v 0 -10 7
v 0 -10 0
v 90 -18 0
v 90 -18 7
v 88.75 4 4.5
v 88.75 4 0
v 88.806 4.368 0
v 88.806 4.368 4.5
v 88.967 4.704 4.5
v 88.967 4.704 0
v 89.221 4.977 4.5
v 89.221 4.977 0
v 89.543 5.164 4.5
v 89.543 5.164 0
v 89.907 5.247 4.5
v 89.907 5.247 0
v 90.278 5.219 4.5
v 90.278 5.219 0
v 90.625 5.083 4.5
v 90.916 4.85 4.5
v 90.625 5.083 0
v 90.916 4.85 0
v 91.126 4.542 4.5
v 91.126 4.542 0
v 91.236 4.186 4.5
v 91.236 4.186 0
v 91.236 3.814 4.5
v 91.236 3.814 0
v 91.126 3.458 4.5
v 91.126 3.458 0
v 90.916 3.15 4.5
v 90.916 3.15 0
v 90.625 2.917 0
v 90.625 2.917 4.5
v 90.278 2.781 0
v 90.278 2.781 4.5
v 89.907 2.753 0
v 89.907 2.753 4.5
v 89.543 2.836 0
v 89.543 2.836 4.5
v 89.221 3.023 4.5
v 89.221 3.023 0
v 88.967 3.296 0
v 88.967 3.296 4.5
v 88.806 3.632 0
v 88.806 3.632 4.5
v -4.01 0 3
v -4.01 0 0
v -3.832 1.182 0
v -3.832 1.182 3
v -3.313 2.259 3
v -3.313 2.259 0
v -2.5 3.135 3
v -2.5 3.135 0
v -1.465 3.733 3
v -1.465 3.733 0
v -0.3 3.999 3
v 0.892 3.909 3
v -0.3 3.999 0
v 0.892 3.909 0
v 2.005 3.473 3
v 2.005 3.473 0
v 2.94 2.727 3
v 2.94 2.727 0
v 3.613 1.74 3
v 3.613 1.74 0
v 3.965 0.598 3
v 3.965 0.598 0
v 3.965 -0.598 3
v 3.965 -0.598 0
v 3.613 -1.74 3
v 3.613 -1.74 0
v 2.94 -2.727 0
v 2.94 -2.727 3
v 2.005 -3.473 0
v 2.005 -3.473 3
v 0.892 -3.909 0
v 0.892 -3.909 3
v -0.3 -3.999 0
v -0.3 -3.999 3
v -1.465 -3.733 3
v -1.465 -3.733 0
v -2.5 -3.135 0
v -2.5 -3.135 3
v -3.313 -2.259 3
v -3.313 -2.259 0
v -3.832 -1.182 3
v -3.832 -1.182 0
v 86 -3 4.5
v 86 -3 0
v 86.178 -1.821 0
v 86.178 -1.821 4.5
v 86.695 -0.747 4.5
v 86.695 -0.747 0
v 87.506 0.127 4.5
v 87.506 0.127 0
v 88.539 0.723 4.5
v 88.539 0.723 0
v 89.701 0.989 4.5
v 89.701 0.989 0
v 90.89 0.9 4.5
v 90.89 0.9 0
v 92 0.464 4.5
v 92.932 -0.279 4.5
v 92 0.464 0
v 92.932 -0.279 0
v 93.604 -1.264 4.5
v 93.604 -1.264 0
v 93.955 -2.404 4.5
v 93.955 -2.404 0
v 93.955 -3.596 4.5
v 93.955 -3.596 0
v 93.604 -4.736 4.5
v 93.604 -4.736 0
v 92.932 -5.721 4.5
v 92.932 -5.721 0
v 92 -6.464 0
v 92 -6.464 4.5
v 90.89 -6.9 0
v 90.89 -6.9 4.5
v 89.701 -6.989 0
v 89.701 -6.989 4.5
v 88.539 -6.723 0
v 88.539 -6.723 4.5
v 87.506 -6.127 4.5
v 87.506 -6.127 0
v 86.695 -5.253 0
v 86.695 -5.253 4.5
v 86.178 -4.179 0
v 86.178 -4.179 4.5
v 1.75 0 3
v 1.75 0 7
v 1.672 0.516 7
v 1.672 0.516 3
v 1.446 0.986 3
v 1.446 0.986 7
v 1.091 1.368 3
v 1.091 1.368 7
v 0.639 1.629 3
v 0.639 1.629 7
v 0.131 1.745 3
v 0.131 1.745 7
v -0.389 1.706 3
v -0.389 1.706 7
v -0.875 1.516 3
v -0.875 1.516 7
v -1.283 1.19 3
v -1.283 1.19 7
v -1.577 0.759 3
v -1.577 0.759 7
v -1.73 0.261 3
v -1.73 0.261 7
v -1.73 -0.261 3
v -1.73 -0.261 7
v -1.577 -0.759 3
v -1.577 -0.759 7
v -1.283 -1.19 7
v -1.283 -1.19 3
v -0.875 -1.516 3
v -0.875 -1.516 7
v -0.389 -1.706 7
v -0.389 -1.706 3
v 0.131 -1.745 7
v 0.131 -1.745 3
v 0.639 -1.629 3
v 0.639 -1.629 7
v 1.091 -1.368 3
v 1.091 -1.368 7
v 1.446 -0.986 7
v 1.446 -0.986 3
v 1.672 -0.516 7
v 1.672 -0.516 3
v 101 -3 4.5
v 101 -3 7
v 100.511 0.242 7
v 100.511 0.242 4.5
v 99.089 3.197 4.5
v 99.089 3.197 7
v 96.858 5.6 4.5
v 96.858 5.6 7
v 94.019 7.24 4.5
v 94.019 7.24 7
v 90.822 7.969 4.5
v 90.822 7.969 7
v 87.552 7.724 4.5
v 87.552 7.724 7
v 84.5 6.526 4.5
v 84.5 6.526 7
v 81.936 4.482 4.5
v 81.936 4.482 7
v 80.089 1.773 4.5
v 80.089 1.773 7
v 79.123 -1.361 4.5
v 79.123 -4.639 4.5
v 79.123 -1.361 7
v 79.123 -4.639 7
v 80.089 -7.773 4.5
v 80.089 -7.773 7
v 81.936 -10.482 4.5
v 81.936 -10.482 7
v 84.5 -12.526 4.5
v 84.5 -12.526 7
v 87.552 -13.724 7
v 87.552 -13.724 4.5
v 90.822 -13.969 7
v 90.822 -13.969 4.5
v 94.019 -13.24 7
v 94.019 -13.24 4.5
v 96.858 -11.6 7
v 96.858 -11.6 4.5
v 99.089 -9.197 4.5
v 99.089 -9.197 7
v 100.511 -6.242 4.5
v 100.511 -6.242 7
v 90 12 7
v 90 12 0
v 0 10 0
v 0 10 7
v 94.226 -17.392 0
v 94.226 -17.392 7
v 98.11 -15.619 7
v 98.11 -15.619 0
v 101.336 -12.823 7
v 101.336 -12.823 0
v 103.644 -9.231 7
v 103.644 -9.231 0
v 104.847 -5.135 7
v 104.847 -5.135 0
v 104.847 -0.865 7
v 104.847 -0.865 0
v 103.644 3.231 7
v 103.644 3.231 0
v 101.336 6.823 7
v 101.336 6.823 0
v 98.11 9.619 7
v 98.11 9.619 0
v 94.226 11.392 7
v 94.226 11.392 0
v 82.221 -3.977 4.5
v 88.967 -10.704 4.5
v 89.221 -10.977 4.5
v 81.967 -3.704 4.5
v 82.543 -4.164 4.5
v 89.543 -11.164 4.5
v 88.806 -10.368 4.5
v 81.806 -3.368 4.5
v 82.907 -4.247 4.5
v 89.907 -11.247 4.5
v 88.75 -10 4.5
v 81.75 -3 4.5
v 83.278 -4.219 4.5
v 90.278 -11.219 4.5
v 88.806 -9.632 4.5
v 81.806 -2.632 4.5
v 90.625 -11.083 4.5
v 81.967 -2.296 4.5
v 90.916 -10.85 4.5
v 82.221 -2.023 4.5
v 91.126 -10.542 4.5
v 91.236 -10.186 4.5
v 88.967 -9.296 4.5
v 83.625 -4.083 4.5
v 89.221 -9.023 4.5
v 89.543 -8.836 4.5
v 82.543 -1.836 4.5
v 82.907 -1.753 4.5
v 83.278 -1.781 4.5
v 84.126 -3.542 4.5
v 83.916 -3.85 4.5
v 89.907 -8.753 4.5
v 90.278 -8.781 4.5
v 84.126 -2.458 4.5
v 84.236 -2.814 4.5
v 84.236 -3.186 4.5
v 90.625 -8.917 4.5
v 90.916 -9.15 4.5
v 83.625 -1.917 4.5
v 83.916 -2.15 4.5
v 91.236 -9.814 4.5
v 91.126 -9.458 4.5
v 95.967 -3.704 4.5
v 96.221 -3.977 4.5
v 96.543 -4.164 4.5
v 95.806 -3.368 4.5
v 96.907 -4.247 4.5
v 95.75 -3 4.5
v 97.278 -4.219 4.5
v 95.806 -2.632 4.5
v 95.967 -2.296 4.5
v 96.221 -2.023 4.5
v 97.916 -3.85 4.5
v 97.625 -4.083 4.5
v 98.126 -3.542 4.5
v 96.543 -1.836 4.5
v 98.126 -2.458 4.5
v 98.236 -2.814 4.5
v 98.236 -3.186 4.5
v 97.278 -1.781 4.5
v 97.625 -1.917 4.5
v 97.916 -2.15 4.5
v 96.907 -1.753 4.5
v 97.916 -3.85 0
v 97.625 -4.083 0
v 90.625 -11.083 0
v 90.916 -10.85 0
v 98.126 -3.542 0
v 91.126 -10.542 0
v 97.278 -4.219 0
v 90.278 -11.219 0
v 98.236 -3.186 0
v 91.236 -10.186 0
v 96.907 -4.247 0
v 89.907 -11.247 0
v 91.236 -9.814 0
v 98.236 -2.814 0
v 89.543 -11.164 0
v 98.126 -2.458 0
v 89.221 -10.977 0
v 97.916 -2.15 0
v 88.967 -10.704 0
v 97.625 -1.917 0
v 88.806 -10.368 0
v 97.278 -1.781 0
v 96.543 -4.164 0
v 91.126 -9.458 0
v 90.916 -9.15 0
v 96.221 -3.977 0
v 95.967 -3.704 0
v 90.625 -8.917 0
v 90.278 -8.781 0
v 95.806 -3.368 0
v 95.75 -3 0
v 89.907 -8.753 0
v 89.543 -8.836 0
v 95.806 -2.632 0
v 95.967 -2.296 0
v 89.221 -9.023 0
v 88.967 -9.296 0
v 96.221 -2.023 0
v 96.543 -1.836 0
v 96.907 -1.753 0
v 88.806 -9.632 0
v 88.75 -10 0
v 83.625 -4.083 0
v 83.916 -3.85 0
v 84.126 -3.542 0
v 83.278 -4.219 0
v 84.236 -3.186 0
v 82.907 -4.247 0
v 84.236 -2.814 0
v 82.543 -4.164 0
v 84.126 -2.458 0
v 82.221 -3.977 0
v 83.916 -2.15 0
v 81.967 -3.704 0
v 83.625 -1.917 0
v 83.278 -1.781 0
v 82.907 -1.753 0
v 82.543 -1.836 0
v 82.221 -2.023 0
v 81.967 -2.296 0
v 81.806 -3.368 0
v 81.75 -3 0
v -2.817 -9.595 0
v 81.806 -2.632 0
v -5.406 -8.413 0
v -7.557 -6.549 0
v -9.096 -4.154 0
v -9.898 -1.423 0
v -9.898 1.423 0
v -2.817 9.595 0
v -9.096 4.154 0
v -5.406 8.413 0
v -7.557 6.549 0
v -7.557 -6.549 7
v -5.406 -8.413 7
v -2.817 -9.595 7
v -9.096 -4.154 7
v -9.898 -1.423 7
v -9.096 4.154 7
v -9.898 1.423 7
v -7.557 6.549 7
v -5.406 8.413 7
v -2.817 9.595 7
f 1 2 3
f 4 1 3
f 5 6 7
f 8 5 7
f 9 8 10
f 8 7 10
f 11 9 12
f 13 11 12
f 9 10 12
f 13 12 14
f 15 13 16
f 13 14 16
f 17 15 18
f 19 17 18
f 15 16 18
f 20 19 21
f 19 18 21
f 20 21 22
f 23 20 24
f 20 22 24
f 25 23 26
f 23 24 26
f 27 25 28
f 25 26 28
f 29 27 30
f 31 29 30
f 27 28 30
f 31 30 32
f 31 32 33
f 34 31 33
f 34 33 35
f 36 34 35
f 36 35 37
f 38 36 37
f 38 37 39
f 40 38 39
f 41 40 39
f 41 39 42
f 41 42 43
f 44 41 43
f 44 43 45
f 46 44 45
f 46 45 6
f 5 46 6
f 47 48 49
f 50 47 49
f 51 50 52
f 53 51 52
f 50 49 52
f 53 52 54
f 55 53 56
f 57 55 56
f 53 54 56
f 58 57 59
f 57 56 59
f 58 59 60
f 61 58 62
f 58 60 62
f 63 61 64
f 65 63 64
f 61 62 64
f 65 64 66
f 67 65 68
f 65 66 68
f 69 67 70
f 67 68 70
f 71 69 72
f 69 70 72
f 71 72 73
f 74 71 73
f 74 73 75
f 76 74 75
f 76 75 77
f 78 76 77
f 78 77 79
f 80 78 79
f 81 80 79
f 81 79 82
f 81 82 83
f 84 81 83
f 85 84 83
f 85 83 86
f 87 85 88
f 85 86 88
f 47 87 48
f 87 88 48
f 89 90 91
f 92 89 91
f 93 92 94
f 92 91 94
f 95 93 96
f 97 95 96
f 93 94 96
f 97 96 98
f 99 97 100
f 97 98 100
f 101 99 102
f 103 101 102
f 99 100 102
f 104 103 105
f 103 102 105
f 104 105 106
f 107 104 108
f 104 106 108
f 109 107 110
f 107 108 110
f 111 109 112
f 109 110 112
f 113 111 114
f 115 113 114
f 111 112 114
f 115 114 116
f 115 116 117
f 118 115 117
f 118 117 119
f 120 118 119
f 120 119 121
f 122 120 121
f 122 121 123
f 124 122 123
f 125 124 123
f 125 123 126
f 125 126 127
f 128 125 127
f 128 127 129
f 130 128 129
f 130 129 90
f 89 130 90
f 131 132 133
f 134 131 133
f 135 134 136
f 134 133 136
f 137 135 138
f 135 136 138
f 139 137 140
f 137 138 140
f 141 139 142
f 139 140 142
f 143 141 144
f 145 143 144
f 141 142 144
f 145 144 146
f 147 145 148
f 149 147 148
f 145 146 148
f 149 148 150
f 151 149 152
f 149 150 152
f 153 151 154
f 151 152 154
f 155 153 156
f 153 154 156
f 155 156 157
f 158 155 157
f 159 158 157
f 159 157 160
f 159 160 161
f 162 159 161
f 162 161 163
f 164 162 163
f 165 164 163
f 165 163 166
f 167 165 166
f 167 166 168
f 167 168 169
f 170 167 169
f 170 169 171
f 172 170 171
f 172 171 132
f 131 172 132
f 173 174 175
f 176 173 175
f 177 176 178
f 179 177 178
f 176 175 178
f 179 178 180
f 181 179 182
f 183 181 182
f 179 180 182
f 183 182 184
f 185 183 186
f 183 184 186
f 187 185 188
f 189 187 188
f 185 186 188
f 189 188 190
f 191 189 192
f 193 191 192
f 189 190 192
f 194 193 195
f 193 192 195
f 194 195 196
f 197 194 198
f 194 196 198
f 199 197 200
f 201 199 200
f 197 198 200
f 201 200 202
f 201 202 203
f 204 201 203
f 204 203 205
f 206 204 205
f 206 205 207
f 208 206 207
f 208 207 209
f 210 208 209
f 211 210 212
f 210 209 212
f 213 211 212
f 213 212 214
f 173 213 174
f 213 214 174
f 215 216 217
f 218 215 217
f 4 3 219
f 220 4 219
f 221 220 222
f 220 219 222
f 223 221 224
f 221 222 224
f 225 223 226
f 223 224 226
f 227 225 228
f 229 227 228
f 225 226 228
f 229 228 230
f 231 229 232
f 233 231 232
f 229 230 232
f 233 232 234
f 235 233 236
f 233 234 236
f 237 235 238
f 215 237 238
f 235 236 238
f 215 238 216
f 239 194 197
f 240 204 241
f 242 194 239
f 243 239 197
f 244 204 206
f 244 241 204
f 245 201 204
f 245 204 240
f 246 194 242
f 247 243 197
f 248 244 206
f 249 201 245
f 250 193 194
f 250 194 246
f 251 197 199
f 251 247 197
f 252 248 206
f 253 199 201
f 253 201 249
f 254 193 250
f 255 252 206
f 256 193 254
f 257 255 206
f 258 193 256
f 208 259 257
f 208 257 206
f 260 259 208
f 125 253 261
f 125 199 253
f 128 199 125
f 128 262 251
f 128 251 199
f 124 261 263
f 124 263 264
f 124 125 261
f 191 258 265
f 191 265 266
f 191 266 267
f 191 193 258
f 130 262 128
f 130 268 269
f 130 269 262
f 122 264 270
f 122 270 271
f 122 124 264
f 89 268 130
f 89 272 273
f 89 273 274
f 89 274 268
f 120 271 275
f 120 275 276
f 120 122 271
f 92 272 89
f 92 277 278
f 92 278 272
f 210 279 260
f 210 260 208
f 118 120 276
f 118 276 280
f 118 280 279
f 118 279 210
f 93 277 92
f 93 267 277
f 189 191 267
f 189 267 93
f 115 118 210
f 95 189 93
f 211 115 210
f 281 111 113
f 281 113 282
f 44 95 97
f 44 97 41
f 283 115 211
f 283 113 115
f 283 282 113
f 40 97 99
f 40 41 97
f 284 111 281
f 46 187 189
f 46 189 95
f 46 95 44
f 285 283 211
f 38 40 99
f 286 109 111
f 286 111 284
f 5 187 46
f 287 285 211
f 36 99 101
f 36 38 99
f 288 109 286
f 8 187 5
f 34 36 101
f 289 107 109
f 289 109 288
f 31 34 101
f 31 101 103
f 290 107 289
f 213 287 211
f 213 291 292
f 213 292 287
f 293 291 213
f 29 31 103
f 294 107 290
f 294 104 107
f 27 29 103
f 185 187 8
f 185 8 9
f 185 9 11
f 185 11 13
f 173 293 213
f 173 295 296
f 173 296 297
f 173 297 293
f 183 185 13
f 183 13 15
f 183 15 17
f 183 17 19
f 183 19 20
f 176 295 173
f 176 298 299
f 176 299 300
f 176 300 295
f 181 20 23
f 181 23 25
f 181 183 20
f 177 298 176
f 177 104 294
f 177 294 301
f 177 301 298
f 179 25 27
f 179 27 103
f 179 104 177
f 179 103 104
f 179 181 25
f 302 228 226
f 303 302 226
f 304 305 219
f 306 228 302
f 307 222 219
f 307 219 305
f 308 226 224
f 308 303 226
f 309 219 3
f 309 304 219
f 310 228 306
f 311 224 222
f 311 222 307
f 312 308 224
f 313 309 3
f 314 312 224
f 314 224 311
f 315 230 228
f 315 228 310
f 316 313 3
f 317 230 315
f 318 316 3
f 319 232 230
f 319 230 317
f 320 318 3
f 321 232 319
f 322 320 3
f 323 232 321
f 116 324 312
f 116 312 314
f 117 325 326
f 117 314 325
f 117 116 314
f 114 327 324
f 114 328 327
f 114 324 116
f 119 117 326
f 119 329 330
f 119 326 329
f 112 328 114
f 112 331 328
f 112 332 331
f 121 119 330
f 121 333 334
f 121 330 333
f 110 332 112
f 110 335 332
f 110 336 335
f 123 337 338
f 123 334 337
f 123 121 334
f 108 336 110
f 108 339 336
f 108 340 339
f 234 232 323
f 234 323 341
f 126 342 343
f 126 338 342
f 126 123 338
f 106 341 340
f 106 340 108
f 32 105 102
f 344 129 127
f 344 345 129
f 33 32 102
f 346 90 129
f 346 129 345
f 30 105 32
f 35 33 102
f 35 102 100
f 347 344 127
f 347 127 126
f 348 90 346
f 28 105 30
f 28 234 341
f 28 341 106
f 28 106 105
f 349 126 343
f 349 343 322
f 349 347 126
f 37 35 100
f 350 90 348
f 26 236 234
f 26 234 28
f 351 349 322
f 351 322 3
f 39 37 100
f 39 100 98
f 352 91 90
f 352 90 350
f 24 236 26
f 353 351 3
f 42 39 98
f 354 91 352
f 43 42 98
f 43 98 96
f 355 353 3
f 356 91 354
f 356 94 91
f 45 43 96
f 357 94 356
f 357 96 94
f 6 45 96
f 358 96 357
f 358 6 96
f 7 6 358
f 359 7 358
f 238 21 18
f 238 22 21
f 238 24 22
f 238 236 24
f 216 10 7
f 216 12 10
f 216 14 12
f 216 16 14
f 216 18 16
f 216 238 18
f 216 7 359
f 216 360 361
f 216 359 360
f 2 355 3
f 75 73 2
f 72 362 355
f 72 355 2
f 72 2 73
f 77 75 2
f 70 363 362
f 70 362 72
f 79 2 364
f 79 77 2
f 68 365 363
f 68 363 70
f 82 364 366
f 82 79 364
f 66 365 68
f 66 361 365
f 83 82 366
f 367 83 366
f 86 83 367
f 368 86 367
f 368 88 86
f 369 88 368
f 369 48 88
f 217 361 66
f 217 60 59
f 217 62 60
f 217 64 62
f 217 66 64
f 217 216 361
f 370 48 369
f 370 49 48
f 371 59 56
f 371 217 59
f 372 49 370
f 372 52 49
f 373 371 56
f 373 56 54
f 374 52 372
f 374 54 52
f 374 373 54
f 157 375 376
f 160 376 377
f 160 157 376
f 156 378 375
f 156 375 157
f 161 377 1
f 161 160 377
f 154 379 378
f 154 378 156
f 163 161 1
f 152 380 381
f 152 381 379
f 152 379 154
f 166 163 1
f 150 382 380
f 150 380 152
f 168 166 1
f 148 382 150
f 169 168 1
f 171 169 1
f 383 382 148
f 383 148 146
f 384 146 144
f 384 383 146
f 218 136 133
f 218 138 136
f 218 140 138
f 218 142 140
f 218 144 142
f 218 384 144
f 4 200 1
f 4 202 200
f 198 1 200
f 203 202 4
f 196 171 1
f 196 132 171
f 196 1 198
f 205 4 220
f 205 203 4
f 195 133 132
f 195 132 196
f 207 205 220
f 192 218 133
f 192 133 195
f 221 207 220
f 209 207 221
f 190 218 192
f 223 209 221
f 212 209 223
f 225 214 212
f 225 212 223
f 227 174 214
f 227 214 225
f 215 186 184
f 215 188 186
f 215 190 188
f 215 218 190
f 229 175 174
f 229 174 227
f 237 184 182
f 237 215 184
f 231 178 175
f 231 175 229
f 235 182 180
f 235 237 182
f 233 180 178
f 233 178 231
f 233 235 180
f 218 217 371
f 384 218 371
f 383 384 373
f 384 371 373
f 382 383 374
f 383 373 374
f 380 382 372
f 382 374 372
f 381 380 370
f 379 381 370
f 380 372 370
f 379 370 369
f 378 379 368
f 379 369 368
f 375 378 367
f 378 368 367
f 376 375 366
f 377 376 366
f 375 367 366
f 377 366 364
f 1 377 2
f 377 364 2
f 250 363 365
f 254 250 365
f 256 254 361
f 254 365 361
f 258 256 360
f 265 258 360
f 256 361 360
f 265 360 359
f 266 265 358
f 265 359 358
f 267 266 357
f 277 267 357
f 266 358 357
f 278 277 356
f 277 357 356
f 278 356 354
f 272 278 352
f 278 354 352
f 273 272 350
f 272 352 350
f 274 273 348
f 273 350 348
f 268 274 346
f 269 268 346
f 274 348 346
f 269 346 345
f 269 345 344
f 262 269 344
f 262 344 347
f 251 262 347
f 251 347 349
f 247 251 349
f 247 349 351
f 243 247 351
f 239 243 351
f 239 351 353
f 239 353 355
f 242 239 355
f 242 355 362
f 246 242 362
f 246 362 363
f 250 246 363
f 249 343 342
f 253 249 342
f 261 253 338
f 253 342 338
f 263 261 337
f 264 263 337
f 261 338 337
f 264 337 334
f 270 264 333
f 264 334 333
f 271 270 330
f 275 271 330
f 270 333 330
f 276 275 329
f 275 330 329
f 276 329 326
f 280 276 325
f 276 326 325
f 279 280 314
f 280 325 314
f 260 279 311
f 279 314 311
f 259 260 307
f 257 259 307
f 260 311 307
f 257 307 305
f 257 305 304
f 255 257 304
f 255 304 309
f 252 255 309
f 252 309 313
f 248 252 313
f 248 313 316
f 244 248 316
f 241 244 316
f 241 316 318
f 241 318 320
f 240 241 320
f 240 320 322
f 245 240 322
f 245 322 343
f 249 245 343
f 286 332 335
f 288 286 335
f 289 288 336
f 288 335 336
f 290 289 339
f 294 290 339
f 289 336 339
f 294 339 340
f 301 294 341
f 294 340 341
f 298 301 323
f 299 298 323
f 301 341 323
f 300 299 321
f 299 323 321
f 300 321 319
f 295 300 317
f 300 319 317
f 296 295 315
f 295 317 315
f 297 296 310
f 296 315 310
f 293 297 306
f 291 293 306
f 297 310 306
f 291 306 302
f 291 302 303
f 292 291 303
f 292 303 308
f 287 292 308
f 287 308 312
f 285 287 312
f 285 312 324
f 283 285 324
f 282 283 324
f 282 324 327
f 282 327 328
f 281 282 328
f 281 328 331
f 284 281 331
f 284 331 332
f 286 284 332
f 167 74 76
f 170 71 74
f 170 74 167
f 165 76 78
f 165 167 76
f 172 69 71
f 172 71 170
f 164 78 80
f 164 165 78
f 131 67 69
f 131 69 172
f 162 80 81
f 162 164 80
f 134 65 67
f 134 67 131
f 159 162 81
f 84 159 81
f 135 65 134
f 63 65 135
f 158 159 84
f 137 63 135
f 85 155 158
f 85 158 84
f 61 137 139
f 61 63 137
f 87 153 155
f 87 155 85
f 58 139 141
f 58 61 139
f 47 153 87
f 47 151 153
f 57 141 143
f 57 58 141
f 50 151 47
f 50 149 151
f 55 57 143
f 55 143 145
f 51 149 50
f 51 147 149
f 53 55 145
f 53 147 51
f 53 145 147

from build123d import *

# Parameters (mm, degrees)
EXTRUDE_1_DEPTH     = 7
SKETCH_2_R          = 4.1
SKETCH_2_R_2        = 1.25
SKETCH_2_R_3        = 4
CUT_EXTRUDE_1_DEPTH = 10
SKETCH_3_R          = 11
CUT_EXTRUDE_2_DEPTH = 2.5
SKETCH_7_R          = 4.1
EXTRUDE_4_DEPTH     = 7
SKETCH_13_R         = 1.75
CUT_EXTRUDE_3_DEPTH = 10
SKETCH_15_R         = 4.01
CUT_EXTRUDE_5_DEPTH = 3


with BuildPart() as part:
    # 草图1 → 凸台-拉伸1 (new body)
    with BuildSketch(Plane.XY):
        with BuildLine():
            Line((0, -10), (90, -18))
            ThreePointArc((90, -18), (105, -3), (90, 12))
            Line((90, 12), (0, 10))
            ThreePointArc((0, 10), (-10, 0), (0, -10))
        make_face()
    extrude(amount=EXTRUDE_1_DEPTH)

    # 草图2 → 切除-拉伸1 (cut)
    with BuildSketch(Plane(origin=(0, 0, 0), x_dir=(-1, 0, 0), z_dir=(0, 0, -1))):
        Circle(SKETCH_2_R)
        with Locations((-90, -10)):
            Circle(SKETCH_2_R_2)
        with Locations((-83, -3)):
            Circle(SKETCH_2_R_2)
        with Locations((-90, 4)):
            Circle(SKETCH_2_R_2)
        with Locations((-97, -3)):
            Circle(SKETCH_2_R_2)
        with Locations((-90, -3)):
            Circle(SKETCH_2_R_3)
    extrude(amount=-CUT_EXTRUDE_1_DEPTH, mode=Mode.SUBTRACT)

    # 草图3 → 切除-拉伸2 (cut)
    with BuildSketch(Plane.XY.offset(7)):
        with Locations((90, -3)):
            Circle(SKETCH_3_R)
    extrude(amount=-CUT_EXTRUDE_2_DEPTH, mode=Mode.SUBTRACT)

    # 草图7 → 凸台-拉伸4 (add)
    with BuildSketch(Plane(origin=(0, 0, 0), x_dir=(-1, 0, 0), z_dir=(0, 0, -1))):
        Circle(SKETCH_7_R)
    extrude(amount=-EXTRUDE_4_DEPTH)

    # 草图13 → 切除-拉伸3 (cut)
    with BuildSketch(Plane.XY.offset(7)):
        Circle(SKETCH_13_R)
    extrude(amount=-CUT_EXTRUDE_3_DEPTH, mode=Mode.SUBTRACT)

    # 草图15 → 切除-拉伸5 (cut)
    with BuildSketch(Plane(origin=(0, 0, 0), x_dir=(-1, 0, 0), z_dir=(0, 0, -1))):
        Circle(SKETCH_15_R)
    extrude(amount=-CUT_EXTRUDE_5_DEPTH, mode=Mode.SUBTRACT)


solid = part.part
